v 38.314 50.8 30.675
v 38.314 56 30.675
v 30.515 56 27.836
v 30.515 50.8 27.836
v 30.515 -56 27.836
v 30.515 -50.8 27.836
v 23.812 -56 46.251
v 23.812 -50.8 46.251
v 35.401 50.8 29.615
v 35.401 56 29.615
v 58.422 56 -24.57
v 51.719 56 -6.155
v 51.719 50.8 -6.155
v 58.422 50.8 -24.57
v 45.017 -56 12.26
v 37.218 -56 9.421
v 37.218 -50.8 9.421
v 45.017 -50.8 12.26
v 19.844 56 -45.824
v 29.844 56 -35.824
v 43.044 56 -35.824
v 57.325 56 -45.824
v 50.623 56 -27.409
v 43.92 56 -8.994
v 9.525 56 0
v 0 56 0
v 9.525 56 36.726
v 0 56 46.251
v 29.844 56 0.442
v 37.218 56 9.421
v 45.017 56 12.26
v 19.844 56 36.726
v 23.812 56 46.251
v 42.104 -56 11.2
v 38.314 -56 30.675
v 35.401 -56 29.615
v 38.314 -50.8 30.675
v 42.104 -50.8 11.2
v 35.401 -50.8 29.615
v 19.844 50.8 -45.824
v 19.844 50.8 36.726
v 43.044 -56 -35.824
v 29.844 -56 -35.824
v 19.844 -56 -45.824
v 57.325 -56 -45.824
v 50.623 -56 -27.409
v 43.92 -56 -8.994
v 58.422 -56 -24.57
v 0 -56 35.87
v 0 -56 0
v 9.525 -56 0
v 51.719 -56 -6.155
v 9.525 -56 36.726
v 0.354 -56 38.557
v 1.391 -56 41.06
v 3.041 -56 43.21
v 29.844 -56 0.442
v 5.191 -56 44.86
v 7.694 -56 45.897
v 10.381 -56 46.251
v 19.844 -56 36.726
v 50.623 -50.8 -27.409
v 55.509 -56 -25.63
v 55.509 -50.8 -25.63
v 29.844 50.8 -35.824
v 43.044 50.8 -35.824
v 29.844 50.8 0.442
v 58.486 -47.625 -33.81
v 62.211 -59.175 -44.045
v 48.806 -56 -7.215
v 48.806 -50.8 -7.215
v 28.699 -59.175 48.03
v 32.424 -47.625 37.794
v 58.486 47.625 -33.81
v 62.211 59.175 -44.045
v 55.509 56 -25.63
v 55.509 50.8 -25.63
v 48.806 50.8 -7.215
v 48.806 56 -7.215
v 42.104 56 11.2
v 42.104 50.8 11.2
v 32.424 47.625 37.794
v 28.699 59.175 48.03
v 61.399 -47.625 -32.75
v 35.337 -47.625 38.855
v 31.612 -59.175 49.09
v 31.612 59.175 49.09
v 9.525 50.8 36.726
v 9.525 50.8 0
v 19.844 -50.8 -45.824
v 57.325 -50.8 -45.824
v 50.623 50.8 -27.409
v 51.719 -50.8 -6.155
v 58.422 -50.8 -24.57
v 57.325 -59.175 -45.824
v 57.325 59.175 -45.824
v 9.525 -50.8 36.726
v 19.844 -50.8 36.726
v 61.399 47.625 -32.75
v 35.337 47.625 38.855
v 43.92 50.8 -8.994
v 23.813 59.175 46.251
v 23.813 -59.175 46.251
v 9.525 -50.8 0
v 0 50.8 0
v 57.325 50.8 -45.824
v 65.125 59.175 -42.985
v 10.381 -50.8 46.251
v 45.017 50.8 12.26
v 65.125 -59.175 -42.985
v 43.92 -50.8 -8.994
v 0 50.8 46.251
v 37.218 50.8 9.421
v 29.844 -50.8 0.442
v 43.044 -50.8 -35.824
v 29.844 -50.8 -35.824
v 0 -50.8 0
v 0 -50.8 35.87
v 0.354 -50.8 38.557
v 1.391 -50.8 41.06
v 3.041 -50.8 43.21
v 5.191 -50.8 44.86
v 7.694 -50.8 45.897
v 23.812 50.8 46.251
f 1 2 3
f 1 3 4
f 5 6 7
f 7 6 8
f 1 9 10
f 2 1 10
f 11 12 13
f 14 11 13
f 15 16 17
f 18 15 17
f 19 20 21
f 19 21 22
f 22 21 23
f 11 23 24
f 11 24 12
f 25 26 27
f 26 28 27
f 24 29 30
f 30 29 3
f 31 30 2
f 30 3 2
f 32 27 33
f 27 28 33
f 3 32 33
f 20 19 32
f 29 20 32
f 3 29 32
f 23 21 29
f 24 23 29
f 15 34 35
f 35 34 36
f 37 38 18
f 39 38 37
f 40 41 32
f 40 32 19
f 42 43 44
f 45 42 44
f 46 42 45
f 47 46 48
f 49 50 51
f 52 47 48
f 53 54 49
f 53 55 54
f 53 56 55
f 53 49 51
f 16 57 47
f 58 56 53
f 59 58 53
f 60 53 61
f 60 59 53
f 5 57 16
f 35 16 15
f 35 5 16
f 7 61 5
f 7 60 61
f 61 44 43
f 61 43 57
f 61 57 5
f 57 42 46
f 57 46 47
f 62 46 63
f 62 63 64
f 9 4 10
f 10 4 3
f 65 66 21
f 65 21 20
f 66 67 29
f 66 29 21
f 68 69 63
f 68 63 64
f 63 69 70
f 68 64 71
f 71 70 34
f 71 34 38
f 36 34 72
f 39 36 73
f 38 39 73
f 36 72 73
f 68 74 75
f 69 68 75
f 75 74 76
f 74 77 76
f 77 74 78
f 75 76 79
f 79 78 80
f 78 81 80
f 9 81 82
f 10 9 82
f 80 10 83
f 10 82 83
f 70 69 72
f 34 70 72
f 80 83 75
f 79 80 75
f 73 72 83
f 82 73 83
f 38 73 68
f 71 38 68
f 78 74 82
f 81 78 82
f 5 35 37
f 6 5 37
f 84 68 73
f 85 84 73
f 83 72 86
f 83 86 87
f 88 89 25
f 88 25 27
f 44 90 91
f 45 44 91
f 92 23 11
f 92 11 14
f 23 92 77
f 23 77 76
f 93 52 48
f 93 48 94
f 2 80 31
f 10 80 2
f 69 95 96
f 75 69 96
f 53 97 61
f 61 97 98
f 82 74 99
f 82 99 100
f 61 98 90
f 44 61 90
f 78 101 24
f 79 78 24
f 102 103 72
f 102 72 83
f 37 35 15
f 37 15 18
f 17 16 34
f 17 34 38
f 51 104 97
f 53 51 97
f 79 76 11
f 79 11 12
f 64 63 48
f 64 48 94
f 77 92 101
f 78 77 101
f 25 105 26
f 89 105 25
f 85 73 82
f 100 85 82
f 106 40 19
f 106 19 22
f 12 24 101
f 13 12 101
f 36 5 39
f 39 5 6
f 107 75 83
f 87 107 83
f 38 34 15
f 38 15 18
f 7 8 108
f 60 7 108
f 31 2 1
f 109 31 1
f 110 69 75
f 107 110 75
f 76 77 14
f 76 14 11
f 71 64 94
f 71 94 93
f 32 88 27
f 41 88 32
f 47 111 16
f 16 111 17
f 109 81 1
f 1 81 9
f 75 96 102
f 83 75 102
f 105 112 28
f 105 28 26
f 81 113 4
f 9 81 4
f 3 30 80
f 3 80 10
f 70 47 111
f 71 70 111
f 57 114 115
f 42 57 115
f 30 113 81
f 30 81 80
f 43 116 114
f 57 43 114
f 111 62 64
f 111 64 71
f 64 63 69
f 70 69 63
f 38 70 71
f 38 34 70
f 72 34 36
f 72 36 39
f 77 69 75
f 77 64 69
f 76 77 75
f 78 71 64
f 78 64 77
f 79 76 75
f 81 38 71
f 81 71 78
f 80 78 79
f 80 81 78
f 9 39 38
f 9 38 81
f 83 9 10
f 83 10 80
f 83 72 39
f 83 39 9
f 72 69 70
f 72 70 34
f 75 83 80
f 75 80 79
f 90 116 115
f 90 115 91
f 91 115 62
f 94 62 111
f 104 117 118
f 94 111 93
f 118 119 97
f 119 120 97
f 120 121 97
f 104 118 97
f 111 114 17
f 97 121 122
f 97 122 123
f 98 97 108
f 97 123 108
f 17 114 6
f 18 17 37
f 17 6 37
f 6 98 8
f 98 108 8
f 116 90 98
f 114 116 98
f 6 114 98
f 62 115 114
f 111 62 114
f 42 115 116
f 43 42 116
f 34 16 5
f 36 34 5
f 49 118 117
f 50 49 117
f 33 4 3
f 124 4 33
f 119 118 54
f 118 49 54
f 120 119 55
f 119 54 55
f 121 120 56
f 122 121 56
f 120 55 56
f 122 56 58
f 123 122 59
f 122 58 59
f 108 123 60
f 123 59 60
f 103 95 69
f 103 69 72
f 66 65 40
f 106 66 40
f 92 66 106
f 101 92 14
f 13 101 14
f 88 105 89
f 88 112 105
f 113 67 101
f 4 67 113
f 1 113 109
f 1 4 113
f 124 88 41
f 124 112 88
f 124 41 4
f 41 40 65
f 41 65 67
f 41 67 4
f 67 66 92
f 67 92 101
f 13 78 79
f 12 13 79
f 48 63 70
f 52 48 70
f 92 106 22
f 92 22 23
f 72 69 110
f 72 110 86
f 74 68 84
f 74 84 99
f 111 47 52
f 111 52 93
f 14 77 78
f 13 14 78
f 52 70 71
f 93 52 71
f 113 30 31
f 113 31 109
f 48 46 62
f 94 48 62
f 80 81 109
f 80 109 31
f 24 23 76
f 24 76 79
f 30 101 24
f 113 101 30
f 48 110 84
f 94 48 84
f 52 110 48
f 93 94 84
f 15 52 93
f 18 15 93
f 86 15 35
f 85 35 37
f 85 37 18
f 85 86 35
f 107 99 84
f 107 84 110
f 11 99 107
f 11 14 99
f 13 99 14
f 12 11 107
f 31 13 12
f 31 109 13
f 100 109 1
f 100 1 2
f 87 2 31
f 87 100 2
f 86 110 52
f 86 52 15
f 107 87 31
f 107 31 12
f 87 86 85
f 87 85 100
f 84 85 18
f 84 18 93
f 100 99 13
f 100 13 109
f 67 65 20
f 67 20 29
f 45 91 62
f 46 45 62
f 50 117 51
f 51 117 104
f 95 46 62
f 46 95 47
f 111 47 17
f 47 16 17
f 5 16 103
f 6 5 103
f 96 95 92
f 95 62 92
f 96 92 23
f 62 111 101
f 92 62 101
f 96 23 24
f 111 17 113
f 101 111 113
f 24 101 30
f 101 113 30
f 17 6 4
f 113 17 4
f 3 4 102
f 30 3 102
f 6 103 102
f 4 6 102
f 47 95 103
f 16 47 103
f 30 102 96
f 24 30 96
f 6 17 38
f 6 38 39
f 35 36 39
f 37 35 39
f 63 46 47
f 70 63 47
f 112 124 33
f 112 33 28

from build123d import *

# Parameters (mm, degrees)
F3_DEPTH  = 5.2
F4_W      = 5.2
F4_H      = 19.5968336801
F5_DEPTH  = 8.3
F7_W      = 118.35
F7_H      = 97.9841684007
F7_W_2    = 5.2
F7_H_2    = 19.5968336801
F8_DEPTH  = 5.2
F9_W      = 118.35
F9_H      = 97.9841684007
F9_W_2    = 5.2
F9_H_2    = 19.5968336801
F9_W_3    = 95.25
F9_H_3    = 76.2
F10_DEPTH = 3.1
F11_R     = 10.3811183182


with BuildPart() as f3:
    # F2 (on offset) → F3 (new body)
    with BuildSketch(Plane.XZ.offset(50.8)):
        Polygon((0, 0), (9.525, 0), (9.525, 36.7260310531), (19.84375, 36.7260310531), (19.84375, -45.8239689469), (57.3250593201, -45.8239689469), (23.8125, 46.2510310531), (0, 46.2510310531), align=None)
        Polygon((29.84375, 0.4422638653), (43.0435792526, -35.8239689469), (29.84375, -35.8239689469), align=None, mode=Mode.SUBTRACT)
    extrude(amount=F3_DEPTH)

    # F4 (on face) → F5 (join)
    with BuildSketch(Plane(origin=(35.891761499, 0, 13.063532841), x_dir=(0, 1, 0), z_dir=(0.9396926208, 0, 0.3420201433))):
        with Locations((-53.4, 5.9221474011)):
            Rectangle(F4_W, F4_H)
        with Locations((-53.4, -33.2715199591)):
            Rectangle(F4_W, F4_H)
    extrude(amount=F5_DEPTH)


with BuildPart() as f6_1:
    # F6: instance of F3
    add(f3.part.mirror(Plane.XZ))


with BuildPart() as f8:
    # F7 (on face) → F8 (new body)
    with BuildSketch(Plane(origin=(35.891761499, 0, 13.063532841), x_dir=(0, 1, 0), z_dir=(0.9396926208, 0, 0.3420201433))):
        with Locations((0, -13.674686279)):
            Rectangle(F7_W, F7_H)
        with Locations((-53.4, -33.2715199591)):
            Rectangle(F7_W_2, F7_H_2, mode=Mode.SUBTRACT)
        with Locations((53.4, -33.2715199591)):
            Rectangle(F7_W_2, F7_H_2, mode=Mode.SUBTRACT)
        with Locations((-53.4, 5.9221474011)):
            Rectangle(F7_W_2, F7_H_2, mode=Mode.SUBTRACT)
        with Locations((53.4, 5.9221474011)):
            Rectangle(F7_W_2, F7_H_2, mode=Mode.SUBTRACT)
    extrude(amount=F8_DEPTH)


with BuildPart() as f10:
    # F9 (on face) → F10 (new body)
    with BuildSketch(Plane(origin=(40.778163127, 0, 14.8420375863), x_dir=(0, 1, 0), z_dir=(0.9396926208, 0, 0.3420201433))):
        with Locations((0, -13.674686279)):
            Rectangle(F9_W, F9_H)
        with Locations((-53.4, -33.2715199591)):
            Rectangle(F9_W_2, F9_H_2, mode=Mode.SUBTRACT)
        with Locations((53.4, -33.2715199591)):
            Rectangle(F9_W_2, F9_H_2, mode=Mode.SUBTRACT)
        with Locations((-53.4, 5.9221474011)):
            Rectangle(F9_W_2, F9_H_2, mode=Mode.SUBTRACT)
        with Locations((0, -13.674686279)):
            Rectangle(F9_W_3, F9_H_3, mode=Mode.SUBTRACT)
        with Locations((53.4, 5.9221474011)):
            Rectangle(F9_W_2, F9_H_2, mode=Mode.SUBTRACT)
    extrude(amount=F10_DEPTH)


with BuildPart() as f3_1:
    add(f3.part)

    # F11
    f11_edges = [f3_1.edges().sort_by_distance(p)[0] for p in [
        (0, -53.4, 46.251031),
    ]]
    fillet(f11_edges, radius=F11_R)


solid = Compound([f6_1.part, f8.part, f10.part, f3_1.part])
